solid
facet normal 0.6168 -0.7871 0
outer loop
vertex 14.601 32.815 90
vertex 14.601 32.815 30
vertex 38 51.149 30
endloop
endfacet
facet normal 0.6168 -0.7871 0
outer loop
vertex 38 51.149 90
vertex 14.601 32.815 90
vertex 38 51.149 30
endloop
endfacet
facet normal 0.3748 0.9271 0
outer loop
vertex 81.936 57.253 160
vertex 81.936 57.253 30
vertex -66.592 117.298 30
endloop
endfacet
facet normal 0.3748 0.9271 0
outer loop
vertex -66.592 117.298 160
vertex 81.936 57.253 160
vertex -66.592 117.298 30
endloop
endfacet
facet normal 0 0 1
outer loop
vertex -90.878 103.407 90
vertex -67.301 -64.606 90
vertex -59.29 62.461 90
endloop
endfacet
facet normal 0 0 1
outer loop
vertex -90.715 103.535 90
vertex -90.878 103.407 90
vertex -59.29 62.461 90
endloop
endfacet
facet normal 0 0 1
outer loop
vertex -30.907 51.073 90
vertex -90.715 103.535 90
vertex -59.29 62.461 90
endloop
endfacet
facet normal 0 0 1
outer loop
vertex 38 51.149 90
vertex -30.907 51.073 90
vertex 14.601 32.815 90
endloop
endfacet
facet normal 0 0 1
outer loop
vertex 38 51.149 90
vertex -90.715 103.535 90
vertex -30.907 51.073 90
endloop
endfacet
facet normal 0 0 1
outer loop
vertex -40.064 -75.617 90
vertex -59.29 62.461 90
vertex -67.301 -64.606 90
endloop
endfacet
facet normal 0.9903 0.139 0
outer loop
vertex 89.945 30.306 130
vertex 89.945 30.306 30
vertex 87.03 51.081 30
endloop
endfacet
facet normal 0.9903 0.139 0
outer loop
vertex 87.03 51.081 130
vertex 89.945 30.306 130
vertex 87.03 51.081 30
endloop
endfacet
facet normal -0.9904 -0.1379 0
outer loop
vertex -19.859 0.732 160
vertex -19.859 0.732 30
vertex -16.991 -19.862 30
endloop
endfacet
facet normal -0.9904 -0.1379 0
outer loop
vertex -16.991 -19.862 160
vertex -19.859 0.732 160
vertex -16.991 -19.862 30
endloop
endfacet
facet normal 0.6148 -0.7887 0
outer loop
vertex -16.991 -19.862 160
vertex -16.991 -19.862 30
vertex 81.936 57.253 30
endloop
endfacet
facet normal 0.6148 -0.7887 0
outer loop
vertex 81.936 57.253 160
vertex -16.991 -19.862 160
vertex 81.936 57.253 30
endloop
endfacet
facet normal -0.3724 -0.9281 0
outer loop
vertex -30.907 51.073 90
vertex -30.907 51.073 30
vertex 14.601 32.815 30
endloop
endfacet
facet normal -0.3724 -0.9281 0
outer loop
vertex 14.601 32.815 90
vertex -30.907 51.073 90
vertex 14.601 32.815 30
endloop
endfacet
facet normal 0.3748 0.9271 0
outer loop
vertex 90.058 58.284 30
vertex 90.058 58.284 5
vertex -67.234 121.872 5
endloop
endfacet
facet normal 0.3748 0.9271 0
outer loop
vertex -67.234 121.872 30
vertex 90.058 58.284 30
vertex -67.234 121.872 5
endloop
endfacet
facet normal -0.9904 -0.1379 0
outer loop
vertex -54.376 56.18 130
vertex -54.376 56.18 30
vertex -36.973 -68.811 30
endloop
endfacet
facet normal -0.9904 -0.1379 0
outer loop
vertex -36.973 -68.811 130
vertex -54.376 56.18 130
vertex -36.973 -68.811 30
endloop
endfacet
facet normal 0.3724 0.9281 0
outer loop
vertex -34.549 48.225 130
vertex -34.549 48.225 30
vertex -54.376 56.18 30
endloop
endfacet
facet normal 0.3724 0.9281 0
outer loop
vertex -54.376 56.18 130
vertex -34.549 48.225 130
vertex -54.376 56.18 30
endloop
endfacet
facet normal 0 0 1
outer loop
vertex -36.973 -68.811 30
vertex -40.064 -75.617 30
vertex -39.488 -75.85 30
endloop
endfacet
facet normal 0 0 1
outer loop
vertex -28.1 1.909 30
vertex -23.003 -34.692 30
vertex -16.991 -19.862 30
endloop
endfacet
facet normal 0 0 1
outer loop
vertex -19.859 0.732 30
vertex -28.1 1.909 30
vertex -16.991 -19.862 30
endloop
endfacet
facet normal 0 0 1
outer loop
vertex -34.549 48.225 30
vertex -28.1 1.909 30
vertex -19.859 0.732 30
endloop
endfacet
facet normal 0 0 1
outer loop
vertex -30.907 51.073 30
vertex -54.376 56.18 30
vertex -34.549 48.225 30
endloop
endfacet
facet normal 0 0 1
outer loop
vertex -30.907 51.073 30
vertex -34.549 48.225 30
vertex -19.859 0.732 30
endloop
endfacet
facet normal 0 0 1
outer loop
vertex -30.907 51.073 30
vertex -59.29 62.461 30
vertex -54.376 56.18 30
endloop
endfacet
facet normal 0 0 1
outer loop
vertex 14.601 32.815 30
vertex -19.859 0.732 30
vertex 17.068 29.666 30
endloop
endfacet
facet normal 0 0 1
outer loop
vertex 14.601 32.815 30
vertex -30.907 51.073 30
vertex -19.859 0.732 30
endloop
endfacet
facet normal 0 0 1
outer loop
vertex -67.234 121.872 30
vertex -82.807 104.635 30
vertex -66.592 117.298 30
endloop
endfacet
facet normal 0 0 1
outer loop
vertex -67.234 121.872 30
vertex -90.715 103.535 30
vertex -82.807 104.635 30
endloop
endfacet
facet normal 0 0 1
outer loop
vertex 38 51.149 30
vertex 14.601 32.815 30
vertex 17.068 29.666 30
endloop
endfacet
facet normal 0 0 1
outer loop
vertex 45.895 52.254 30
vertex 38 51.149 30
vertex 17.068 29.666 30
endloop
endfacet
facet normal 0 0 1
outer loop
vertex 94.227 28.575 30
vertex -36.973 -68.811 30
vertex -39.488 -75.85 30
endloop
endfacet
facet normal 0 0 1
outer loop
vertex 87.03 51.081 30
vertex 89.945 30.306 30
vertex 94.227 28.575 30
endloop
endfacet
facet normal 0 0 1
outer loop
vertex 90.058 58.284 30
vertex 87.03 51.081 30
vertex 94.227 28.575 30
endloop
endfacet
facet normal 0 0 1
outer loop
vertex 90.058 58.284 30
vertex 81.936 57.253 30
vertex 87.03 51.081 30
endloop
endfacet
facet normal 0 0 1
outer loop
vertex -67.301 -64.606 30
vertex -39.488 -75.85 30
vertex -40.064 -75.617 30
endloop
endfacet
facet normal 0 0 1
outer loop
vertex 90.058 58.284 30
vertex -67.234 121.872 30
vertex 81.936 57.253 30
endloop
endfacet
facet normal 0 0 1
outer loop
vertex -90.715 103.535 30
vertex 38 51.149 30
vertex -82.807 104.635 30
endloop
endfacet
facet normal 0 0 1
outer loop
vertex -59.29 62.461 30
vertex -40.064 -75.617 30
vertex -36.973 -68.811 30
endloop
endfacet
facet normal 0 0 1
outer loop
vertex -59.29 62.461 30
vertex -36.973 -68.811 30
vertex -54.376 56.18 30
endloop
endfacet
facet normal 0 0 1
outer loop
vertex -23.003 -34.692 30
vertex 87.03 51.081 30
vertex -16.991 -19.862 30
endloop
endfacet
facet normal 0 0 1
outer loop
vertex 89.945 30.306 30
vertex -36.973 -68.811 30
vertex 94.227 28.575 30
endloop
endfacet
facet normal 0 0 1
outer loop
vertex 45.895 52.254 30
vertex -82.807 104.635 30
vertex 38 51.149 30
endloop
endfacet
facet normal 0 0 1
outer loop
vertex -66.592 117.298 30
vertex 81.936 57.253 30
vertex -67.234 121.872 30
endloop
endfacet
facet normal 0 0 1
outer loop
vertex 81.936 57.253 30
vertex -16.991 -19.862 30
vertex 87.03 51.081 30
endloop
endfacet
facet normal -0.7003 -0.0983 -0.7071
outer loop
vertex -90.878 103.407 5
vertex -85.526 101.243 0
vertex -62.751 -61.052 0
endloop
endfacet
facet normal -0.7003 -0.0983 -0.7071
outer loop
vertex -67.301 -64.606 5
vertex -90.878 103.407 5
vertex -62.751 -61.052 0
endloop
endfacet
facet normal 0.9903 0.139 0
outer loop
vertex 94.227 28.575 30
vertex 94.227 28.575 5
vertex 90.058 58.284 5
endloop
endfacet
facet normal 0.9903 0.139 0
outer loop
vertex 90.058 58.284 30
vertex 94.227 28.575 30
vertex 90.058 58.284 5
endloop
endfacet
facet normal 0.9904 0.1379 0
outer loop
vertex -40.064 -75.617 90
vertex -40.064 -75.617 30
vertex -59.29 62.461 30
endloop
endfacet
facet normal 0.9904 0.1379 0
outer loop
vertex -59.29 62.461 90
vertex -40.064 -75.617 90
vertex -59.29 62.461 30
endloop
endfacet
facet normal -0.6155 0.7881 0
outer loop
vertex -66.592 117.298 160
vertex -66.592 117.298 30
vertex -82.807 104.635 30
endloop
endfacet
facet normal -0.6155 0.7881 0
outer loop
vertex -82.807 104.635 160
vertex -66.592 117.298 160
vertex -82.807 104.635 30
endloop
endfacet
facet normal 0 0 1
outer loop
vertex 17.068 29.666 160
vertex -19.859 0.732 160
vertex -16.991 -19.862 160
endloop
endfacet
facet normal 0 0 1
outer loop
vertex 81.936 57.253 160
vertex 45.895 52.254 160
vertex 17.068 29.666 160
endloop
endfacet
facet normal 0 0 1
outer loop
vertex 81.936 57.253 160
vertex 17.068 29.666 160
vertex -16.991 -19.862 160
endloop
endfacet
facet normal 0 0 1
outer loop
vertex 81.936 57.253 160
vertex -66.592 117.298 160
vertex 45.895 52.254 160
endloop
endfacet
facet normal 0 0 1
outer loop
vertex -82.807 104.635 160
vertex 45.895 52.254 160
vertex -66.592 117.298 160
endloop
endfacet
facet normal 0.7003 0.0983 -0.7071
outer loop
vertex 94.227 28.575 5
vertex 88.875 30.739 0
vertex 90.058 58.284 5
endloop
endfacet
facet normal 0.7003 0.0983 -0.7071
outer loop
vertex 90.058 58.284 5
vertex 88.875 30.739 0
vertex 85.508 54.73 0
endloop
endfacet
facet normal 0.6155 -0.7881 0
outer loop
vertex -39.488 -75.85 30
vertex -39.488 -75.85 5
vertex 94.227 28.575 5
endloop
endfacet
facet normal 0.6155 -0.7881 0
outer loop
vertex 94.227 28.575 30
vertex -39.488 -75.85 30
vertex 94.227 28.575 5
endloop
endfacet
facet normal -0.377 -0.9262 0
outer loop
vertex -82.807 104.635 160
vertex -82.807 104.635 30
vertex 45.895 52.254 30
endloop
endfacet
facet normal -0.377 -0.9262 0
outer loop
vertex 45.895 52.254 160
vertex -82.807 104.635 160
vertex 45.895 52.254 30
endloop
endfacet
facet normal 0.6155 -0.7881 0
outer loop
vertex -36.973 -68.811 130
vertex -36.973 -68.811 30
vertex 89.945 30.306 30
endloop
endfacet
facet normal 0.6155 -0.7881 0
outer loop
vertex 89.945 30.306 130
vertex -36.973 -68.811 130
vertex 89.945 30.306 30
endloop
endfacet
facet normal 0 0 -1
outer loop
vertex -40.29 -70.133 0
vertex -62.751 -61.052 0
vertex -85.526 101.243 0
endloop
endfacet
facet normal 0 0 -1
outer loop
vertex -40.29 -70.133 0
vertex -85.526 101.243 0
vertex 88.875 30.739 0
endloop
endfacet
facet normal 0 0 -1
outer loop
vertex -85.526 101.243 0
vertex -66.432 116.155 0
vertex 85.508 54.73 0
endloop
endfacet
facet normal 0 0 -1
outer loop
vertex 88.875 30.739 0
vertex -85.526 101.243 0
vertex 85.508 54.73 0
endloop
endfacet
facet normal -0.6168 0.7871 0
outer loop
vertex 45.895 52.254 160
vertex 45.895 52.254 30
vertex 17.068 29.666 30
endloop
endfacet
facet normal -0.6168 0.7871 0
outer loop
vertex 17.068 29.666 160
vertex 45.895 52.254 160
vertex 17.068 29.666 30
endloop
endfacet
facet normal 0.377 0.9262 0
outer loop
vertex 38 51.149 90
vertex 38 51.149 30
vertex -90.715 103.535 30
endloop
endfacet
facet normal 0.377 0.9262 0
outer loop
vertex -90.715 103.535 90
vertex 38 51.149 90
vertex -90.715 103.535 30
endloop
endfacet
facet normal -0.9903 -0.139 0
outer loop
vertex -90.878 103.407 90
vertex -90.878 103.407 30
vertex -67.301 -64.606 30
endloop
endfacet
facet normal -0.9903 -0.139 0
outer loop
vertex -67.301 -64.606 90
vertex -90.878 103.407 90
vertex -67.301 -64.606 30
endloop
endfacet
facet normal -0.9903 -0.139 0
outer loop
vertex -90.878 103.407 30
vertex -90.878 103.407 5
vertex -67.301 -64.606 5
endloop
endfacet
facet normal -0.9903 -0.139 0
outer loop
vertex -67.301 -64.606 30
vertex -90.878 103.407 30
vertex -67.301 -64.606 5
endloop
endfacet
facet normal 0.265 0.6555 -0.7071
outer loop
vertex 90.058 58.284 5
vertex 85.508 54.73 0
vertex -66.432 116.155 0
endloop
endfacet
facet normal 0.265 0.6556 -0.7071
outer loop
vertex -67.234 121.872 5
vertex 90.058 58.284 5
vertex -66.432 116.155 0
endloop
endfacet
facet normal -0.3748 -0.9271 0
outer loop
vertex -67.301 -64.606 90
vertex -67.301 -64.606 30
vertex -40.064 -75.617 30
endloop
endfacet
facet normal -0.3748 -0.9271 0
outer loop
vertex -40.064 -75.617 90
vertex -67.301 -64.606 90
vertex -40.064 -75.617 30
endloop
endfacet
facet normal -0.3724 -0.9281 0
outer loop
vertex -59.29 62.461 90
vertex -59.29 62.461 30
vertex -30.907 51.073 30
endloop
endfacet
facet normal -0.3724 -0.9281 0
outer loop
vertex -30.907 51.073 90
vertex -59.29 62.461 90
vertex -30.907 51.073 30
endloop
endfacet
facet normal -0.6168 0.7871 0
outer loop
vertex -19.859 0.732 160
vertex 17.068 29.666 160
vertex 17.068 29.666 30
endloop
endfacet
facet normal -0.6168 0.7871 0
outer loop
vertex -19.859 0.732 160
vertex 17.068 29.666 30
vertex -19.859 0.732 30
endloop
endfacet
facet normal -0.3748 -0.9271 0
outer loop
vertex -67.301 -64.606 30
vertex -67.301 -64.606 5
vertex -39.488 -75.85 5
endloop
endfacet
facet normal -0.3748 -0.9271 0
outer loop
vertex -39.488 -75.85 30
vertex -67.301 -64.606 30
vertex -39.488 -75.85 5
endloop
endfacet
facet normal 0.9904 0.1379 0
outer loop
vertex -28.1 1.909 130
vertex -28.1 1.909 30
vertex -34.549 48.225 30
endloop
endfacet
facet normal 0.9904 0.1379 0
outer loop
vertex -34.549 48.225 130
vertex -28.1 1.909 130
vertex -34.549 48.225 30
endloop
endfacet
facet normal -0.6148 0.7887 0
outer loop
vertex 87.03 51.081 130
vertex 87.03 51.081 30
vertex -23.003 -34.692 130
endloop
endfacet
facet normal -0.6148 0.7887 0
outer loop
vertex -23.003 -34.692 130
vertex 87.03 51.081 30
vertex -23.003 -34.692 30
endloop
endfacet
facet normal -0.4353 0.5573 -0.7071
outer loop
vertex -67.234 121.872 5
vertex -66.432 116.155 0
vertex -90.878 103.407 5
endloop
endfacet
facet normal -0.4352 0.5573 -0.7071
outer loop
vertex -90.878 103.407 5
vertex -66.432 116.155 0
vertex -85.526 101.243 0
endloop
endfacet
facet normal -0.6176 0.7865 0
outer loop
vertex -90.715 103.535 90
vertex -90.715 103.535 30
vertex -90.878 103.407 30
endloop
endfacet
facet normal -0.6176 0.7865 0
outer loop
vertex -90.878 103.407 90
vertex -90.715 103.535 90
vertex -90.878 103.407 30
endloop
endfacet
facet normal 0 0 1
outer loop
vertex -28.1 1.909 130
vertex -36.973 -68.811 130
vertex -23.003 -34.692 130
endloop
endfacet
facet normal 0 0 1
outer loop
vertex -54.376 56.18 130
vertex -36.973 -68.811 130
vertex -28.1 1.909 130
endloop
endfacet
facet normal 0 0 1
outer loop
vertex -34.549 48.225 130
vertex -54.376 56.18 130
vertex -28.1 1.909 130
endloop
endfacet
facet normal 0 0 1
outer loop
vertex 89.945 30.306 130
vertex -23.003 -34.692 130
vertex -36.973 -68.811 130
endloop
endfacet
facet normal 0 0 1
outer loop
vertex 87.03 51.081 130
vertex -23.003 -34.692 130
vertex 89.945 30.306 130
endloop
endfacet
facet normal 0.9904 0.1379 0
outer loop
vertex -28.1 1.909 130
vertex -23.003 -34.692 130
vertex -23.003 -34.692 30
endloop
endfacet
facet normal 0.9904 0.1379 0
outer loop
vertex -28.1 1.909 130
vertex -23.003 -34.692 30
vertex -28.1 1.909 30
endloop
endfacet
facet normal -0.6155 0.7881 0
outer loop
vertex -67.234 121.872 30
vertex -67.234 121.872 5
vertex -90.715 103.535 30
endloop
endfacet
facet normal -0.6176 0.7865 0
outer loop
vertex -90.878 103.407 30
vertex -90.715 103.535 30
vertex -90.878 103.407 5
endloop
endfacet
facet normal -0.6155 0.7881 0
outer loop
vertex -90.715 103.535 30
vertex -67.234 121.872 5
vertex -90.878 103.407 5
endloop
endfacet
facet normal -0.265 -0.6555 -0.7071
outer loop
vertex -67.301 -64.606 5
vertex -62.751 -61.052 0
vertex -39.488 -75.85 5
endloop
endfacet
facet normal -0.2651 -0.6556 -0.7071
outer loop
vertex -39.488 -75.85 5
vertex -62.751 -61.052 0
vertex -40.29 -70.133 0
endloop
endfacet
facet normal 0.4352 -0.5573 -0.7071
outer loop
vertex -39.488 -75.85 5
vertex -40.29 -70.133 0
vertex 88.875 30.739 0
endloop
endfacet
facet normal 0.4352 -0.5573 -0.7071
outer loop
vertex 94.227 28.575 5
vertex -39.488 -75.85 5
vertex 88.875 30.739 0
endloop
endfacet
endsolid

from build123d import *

# Parameters (mm, degrees)
F1_DEPTH = 30
F5_DEPTH = 60
F6_DEPTH = 100
F7_DEPTH = 130
F8_SIZE  = 5


with BuildPart() as f1:
    # F0 (on Top) → F1 (new body)
    with BuildSketch(Plane.XY):
        Polygon((-39.487894, -75.850017), (94.227236, 28.575137), (90.058191, 58.284042), (-67.23421, 121.872165), (-90.878354, 103.407213), (-67.301084, -64.606063), align=None)
    extrude(amount=F1_DEPTH)

    # F2 (on face) → F5 (join)
    with BuildSketch(Plane.XY.offset(30)):
        Polygon((14.600857, 32.81471), (37.999574, 51.148787), (-90.714814, 103.534931), (-90.878354, 103.407213), (-67.301084, -64.606063), (-40.06353, -75.617306), (-59.289651, 62.461207), (-30.906815, 51.073389), align=None)
    extrude(amount=F5_DEPTH)

    # F4 (on face) → F6 (join)
    with BuildSketch(Plane.XY.offset(30)):
        Polygon((87.029812, 51.080902), (-23.003388, -34.692019), (-28.099764, 1.909229), (-34.548747, 48.224661), (-54.376458, 56.179975), (-36.972718, -68.81053), (89.945114, 30.306257), align=None)
    extrude(amount=F6_DEPTH)

    # F3 (on face) → F7 (join)
    with BuildSketch(Plane.XY.offset(30)):
        Polygon((17.067929, 29.66613), (-19.8587, 0.732249), (-16.991157, -19.861924), (81.935531, 57.253266), (-66.592344, 117.29818), (-82.807181, 104.635163), (45.895328, 52.253855), align=None)
    extrude(amount=F7_DEPTH)

    # F8
    f8_edges = [f1.edges().sort_by_distance(p)[0] for p in [
        (11.41199, 90.078103, 0),
        (92.142713, 43.429589, 0),
        (27.369671, -23.63744, 0),
        (-79.056282, 112.639689, 0),
        (-79.089719, 19.400575, 0),
        (-53.394489, -70.22804, 0),
    ]]
    chamfer(f8_edges, length=F8_SIZE)


solid = f1.part
